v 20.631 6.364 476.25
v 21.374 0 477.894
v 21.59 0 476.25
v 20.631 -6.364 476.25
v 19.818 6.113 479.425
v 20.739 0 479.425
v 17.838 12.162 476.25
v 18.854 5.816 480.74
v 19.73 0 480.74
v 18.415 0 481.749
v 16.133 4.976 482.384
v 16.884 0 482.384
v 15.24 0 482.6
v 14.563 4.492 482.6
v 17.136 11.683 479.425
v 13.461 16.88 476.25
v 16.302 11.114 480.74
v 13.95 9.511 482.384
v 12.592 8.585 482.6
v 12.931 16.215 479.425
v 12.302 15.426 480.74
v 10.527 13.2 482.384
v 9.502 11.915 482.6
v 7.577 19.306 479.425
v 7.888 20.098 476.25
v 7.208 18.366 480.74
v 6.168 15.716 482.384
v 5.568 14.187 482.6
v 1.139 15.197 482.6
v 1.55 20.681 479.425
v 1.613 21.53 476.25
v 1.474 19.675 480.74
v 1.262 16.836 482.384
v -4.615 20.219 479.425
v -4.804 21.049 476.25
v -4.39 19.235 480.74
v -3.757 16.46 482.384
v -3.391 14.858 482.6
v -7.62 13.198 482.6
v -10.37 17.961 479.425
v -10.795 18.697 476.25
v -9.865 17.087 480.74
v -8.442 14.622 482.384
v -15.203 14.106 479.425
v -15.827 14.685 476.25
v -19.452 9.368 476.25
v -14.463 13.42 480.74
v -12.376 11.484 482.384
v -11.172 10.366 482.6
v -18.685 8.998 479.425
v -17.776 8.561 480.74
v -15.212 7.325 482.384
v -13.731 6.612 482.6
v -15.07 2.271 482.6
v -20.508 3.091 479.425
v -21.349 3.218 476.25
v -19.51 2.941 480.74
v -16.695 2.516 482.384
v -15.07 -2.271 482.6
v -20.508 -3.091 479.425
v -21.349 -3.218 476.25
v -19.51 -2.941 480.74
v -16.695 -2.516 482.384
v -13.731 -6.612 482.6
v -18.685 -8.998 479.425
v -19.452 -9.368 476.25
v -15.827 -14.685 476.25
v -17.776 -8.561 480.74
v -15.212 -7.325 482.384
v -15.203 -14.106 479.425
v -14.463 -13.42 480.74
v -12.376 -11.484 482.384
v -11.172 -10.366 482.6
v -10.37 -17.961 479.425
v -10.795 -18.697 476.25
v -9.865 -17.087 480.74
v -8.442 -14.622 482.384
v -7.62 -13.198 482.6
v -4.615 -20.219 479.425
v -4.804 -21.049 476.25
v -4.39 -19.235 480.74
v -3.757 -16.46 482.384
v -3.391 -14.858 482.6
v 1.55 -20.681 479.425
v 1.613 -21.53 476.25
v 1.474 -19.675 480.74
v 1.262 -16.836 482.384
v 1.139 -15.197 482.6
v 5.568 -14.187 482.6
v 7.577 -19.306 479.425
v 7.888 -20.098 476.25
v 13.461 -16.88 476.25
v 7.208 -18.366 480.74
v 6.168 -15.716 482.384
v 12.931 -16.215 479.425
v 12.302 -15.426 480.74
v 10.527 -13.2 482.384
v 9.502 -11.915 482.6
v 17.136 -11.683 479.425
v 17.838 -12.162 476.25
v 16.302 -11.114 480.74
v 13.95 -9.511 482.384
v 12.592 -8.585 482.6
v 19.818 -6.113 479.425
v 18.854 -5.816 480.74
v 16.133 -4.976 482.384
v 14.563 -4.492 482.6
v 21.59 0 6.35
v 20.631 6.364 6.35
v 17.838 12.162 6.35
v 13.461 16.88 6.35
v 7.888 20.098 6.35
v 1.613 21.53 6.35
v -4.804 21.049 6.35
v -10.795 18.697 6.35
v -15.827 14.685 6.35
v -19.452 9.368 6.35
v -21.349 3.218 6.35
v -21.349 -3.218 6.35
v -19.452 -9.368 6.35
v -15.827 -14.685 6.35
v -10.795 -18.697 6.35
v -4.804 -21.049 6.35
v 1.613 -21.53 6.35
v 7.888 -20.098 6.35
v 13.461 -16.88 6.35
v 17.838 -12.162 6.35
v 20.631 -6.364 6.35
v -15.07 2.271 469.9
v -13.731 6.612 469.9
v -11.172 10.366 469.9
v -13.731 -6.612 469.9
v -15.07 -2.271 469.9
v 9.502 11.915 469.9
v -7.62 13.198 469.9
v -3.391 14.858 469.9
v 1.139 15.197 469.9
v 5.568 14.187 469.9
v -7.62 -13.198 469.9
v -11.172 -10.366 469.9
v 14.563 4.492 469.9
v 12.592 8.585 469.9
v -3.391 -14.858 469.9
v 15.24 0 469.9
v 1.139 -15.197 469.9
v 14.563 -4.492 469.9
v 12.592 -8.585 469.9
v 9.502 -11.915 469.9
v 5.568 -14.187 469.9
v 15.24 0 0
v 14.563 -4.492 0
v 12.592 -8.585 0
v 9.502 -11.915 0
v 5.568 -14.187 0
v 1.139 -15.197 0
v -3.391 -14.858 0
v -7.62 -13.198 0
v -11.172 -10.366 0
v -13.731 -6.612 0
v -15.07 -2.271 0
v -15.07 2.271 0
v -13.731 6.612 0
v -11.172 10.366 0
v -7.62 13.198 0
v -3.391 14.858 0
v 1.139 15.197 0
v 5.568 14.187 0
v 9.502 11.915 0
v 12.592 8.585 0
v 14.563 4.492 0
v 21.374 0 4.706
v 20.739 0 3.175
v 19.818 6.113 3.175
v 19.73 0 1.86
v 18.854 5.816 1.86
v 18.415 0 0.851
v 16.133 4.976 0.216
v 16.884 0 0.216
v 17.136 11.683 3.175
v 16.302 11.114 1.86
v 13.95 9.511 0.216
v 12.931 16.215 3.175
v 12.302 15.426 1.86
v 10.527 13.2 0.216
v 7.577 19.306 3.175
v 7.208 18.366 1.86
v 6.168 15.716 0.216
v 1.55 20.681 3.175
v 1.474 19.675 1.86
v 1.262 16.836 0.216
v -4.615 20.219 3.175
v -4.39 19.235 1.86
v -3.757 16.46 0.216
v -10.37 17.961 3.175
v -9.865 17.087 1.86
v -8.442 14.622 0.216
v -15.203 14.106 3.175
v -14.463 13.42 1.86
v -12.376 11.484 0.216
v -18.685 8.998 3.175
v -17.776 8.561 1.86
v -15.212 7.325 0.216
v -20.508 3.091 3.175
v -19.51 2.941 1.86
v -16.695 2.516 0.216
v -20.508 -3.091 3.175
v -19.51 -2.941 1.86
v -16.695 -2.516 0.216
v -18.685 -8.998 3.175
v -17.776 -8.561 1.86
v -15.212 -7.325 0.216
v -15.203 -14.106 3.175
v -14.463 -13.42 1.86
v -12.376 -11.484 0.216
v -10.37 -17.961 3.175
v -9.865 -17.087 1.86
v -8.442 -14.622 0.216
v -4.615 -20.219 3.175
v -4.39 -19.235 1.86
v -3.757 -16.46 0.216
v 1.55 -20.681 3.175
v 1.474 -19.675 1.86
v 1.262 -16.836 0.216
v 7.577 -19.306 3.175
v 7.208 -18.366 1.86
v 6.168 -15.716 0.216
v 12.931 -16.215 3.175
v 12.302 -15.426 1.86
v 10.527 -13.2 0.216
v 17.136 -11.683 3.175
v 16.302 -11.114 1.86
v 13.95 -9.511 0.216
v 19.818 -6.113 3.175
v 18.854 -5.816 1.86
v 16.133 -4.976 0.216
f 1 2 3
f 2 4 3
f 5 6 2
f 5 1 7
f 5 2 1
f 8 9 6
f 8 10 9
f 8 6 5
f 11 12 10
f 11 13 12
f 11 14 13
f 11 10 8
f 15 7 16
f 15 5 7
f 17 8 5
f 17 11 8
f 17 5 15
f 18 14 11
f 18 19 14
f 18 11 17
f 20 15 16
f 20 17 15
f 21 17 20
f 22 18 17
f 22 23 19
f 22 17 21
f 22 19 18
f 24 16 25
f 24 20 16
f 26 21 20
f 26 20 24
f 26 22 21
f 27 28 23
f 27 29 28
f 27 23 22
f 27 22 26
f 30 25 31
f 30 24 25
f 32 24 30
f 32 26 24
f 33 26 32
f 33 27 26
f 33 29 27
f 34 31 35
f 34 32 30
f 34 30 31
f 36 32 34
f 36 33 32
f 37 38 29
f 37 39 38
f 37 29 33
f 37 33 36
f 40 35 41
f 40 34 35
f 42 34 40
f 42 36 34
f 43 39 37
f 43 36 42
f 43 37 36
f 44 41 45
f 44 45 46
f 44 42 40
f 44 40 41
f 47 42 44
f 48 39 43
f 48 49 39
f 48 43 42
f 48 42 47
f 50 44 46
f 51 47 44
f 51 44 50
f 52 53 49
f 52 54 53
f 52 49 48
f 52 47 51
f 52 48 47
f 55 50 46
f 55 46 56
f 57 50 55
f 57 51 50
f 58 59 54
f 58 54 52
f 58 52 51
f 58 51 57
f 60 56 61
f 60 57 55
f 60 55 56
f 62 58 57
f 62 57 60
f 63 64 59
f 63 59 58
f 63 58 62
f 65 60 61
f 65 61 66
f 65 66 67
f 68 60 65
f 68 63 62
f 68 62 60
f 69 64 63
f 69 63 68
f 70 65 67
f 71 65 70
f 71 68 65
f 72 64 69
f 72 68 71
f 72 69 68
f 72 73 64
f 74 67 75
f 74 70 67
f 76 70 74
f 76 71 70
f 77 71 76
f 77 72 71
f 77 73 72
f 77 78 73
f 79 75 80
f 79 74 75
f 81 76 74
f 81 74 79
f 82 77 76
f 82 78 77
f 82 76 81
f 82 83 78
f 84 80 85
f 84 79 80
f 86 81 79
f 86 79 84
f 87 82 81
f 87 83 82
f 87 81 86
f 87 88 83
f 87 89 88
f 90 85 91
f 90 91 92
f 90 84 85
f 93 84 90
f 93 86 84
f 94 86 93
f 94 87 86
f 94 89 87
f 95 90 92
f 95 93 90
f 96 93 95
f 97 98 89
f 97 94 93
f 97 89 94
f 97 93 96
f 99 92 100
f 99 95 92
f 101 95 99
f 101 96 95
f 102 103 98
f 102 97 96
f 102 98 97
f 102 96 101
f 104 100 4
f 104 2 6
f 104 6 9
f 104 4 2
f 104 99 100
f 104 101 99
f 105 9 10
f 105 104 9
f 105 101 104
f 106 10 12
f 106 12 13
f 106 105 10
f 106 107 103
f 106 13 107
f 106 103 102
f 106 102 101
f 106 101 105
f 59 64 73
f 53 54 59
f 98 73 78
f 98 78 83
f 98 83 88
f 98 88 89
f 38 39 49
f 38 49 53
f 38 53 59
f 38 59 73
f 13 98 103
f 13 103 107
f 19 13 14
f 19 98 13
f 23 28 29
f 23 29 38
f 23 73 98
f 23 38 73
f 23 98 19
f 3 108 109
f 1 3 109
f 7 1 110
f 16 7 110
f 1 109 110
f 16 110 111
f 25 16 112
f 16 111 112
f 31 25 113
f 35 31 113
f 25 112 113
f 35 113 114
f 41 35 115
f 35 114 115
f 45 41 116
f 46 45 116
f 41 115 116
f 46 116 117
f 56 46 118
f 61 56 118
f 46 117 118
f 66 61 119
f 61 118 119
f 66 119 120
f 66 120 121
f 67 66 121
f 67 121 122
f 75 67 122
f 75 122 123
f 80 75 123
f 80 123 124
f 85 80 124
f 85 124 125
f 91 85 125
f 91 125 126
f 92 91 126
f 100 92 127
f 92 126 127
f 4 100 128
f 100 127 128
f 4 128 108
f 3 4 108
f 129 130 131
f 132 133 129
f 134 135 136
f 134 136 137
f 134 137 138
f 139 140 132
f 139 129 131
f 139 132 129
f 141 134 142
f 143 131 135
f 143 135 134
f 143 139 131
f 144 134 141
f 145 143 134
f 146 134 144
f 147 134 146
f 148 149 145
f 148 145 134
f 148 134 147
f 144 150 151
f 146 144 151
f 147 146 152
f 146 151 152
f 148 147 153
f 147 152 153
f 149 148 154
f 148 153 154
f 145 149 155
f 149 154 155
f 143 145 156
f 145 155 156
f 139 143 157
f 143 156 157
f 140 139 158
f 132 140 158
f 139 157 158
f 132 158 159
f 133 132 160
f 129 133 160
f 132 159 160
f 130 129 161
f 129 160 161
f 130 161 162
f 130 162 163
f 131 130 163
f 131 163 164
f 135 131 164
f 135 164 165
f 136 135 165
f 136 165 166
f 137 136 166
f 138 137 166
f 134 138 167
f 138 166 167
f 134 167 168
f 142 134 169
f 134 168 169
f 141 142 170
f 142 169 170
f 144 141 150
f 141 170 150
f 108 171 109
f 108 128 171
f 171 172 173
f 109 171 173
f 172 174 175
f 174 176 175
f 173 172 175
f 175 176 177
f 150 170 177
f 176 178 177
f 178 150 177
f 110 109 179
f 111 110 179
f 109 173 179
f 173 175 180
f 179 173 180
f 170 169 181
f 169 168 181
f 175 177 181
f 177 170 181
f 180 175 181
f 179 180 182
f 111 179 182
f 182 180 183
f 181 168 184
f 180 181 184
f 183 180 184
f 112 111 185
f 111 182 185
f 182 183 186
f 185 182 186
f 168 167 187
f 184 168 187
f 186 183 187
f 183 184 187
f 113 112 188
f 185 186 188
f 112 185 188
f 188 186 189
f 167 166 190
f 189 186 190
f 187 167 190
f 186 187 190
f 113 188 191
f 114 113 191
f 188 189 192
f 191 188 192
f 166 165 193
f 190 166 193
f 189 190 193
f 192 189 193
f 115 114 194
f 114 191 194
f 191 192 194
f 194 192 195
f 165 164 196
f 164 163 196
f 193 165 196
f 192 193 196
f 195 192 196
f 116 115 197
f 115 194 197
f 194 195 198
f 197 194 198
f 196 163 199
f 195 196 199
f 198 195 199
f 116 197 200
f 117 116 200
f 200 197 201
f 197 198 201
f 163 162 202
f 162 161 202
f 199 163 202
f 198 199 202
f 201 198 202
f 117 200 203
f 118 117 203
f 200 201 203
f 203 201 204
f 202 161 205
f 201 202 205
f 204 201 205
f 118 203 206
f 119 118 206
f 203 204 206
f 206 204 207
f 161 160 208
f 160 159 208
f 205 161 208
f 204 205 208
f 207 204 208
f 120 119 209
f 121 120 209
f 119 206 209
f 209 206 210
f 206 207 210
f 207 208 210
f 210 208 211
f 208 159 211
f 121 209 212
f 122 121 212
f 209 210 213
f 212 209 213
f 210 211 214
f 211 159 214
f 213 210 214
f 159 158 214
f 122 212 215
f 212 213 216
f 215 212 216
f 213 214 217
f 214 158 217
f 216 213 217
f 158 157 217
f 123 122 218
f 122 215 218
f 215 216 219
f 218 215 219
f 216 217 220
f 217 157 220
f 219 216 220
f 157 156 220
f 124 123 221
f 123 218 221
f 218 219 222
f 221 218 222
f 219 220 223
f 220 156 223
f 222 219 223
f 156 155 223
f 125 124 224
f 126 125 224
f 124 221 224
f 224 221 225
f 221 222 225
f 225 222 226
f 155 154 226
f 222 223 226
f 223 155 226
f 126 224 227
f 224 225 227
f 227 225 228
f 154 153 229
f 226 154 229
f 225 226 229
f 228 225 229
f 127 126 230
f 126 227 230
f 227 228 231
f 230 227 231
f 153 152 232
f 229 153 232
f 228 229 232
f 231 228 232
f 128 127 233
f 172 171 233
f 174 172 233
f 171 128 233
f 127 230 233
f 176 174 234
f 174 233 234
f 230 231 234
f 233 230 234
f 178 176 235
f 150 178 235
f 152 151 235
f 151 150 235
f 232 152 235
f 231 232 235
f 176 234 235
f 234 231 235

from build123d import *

# Parameters (mm, degrees)
F0_R      = 21.59
F1_DEPTH  = 482.6
F2_R      = 6.35
F3_R      = 6.35
F1_FACE_R = 15.24
F4_DEPTH  = 469.9


with BuildPart() as f1:
    # F0 (on Top) → F1 (new body)
    with BuildSketch(Plane.XY):
        Circle(F0_R)
    extrude(amount=F1_DEPTH)

    # F2
    f2_edges = [f1.edges().sort_by_distance(p)[0] for p in [
        (-21.59, 0, 0),
    ]]
    fillet(f2_edges, radius=F2_R)

    # F3
    f3_edges = [f1.edges().sort_by_distance(p)[0] for p in [
        (-21.59, 0, 482.6),
    ]]
    fillet(f3_edges, radius=F3_R)

    # F1_face (on face) → F4 (cut)
    with BuildSketch(Plane(origin=(0, 0, 0), x_dir=(1, 0, 0), z_dir=(0, 0, -1))):
        Circle(F1_FACE_R)
    extrude(amount=-F4_DEPTH, mode=Mode.SUBTRACT)


solid = f1.part
